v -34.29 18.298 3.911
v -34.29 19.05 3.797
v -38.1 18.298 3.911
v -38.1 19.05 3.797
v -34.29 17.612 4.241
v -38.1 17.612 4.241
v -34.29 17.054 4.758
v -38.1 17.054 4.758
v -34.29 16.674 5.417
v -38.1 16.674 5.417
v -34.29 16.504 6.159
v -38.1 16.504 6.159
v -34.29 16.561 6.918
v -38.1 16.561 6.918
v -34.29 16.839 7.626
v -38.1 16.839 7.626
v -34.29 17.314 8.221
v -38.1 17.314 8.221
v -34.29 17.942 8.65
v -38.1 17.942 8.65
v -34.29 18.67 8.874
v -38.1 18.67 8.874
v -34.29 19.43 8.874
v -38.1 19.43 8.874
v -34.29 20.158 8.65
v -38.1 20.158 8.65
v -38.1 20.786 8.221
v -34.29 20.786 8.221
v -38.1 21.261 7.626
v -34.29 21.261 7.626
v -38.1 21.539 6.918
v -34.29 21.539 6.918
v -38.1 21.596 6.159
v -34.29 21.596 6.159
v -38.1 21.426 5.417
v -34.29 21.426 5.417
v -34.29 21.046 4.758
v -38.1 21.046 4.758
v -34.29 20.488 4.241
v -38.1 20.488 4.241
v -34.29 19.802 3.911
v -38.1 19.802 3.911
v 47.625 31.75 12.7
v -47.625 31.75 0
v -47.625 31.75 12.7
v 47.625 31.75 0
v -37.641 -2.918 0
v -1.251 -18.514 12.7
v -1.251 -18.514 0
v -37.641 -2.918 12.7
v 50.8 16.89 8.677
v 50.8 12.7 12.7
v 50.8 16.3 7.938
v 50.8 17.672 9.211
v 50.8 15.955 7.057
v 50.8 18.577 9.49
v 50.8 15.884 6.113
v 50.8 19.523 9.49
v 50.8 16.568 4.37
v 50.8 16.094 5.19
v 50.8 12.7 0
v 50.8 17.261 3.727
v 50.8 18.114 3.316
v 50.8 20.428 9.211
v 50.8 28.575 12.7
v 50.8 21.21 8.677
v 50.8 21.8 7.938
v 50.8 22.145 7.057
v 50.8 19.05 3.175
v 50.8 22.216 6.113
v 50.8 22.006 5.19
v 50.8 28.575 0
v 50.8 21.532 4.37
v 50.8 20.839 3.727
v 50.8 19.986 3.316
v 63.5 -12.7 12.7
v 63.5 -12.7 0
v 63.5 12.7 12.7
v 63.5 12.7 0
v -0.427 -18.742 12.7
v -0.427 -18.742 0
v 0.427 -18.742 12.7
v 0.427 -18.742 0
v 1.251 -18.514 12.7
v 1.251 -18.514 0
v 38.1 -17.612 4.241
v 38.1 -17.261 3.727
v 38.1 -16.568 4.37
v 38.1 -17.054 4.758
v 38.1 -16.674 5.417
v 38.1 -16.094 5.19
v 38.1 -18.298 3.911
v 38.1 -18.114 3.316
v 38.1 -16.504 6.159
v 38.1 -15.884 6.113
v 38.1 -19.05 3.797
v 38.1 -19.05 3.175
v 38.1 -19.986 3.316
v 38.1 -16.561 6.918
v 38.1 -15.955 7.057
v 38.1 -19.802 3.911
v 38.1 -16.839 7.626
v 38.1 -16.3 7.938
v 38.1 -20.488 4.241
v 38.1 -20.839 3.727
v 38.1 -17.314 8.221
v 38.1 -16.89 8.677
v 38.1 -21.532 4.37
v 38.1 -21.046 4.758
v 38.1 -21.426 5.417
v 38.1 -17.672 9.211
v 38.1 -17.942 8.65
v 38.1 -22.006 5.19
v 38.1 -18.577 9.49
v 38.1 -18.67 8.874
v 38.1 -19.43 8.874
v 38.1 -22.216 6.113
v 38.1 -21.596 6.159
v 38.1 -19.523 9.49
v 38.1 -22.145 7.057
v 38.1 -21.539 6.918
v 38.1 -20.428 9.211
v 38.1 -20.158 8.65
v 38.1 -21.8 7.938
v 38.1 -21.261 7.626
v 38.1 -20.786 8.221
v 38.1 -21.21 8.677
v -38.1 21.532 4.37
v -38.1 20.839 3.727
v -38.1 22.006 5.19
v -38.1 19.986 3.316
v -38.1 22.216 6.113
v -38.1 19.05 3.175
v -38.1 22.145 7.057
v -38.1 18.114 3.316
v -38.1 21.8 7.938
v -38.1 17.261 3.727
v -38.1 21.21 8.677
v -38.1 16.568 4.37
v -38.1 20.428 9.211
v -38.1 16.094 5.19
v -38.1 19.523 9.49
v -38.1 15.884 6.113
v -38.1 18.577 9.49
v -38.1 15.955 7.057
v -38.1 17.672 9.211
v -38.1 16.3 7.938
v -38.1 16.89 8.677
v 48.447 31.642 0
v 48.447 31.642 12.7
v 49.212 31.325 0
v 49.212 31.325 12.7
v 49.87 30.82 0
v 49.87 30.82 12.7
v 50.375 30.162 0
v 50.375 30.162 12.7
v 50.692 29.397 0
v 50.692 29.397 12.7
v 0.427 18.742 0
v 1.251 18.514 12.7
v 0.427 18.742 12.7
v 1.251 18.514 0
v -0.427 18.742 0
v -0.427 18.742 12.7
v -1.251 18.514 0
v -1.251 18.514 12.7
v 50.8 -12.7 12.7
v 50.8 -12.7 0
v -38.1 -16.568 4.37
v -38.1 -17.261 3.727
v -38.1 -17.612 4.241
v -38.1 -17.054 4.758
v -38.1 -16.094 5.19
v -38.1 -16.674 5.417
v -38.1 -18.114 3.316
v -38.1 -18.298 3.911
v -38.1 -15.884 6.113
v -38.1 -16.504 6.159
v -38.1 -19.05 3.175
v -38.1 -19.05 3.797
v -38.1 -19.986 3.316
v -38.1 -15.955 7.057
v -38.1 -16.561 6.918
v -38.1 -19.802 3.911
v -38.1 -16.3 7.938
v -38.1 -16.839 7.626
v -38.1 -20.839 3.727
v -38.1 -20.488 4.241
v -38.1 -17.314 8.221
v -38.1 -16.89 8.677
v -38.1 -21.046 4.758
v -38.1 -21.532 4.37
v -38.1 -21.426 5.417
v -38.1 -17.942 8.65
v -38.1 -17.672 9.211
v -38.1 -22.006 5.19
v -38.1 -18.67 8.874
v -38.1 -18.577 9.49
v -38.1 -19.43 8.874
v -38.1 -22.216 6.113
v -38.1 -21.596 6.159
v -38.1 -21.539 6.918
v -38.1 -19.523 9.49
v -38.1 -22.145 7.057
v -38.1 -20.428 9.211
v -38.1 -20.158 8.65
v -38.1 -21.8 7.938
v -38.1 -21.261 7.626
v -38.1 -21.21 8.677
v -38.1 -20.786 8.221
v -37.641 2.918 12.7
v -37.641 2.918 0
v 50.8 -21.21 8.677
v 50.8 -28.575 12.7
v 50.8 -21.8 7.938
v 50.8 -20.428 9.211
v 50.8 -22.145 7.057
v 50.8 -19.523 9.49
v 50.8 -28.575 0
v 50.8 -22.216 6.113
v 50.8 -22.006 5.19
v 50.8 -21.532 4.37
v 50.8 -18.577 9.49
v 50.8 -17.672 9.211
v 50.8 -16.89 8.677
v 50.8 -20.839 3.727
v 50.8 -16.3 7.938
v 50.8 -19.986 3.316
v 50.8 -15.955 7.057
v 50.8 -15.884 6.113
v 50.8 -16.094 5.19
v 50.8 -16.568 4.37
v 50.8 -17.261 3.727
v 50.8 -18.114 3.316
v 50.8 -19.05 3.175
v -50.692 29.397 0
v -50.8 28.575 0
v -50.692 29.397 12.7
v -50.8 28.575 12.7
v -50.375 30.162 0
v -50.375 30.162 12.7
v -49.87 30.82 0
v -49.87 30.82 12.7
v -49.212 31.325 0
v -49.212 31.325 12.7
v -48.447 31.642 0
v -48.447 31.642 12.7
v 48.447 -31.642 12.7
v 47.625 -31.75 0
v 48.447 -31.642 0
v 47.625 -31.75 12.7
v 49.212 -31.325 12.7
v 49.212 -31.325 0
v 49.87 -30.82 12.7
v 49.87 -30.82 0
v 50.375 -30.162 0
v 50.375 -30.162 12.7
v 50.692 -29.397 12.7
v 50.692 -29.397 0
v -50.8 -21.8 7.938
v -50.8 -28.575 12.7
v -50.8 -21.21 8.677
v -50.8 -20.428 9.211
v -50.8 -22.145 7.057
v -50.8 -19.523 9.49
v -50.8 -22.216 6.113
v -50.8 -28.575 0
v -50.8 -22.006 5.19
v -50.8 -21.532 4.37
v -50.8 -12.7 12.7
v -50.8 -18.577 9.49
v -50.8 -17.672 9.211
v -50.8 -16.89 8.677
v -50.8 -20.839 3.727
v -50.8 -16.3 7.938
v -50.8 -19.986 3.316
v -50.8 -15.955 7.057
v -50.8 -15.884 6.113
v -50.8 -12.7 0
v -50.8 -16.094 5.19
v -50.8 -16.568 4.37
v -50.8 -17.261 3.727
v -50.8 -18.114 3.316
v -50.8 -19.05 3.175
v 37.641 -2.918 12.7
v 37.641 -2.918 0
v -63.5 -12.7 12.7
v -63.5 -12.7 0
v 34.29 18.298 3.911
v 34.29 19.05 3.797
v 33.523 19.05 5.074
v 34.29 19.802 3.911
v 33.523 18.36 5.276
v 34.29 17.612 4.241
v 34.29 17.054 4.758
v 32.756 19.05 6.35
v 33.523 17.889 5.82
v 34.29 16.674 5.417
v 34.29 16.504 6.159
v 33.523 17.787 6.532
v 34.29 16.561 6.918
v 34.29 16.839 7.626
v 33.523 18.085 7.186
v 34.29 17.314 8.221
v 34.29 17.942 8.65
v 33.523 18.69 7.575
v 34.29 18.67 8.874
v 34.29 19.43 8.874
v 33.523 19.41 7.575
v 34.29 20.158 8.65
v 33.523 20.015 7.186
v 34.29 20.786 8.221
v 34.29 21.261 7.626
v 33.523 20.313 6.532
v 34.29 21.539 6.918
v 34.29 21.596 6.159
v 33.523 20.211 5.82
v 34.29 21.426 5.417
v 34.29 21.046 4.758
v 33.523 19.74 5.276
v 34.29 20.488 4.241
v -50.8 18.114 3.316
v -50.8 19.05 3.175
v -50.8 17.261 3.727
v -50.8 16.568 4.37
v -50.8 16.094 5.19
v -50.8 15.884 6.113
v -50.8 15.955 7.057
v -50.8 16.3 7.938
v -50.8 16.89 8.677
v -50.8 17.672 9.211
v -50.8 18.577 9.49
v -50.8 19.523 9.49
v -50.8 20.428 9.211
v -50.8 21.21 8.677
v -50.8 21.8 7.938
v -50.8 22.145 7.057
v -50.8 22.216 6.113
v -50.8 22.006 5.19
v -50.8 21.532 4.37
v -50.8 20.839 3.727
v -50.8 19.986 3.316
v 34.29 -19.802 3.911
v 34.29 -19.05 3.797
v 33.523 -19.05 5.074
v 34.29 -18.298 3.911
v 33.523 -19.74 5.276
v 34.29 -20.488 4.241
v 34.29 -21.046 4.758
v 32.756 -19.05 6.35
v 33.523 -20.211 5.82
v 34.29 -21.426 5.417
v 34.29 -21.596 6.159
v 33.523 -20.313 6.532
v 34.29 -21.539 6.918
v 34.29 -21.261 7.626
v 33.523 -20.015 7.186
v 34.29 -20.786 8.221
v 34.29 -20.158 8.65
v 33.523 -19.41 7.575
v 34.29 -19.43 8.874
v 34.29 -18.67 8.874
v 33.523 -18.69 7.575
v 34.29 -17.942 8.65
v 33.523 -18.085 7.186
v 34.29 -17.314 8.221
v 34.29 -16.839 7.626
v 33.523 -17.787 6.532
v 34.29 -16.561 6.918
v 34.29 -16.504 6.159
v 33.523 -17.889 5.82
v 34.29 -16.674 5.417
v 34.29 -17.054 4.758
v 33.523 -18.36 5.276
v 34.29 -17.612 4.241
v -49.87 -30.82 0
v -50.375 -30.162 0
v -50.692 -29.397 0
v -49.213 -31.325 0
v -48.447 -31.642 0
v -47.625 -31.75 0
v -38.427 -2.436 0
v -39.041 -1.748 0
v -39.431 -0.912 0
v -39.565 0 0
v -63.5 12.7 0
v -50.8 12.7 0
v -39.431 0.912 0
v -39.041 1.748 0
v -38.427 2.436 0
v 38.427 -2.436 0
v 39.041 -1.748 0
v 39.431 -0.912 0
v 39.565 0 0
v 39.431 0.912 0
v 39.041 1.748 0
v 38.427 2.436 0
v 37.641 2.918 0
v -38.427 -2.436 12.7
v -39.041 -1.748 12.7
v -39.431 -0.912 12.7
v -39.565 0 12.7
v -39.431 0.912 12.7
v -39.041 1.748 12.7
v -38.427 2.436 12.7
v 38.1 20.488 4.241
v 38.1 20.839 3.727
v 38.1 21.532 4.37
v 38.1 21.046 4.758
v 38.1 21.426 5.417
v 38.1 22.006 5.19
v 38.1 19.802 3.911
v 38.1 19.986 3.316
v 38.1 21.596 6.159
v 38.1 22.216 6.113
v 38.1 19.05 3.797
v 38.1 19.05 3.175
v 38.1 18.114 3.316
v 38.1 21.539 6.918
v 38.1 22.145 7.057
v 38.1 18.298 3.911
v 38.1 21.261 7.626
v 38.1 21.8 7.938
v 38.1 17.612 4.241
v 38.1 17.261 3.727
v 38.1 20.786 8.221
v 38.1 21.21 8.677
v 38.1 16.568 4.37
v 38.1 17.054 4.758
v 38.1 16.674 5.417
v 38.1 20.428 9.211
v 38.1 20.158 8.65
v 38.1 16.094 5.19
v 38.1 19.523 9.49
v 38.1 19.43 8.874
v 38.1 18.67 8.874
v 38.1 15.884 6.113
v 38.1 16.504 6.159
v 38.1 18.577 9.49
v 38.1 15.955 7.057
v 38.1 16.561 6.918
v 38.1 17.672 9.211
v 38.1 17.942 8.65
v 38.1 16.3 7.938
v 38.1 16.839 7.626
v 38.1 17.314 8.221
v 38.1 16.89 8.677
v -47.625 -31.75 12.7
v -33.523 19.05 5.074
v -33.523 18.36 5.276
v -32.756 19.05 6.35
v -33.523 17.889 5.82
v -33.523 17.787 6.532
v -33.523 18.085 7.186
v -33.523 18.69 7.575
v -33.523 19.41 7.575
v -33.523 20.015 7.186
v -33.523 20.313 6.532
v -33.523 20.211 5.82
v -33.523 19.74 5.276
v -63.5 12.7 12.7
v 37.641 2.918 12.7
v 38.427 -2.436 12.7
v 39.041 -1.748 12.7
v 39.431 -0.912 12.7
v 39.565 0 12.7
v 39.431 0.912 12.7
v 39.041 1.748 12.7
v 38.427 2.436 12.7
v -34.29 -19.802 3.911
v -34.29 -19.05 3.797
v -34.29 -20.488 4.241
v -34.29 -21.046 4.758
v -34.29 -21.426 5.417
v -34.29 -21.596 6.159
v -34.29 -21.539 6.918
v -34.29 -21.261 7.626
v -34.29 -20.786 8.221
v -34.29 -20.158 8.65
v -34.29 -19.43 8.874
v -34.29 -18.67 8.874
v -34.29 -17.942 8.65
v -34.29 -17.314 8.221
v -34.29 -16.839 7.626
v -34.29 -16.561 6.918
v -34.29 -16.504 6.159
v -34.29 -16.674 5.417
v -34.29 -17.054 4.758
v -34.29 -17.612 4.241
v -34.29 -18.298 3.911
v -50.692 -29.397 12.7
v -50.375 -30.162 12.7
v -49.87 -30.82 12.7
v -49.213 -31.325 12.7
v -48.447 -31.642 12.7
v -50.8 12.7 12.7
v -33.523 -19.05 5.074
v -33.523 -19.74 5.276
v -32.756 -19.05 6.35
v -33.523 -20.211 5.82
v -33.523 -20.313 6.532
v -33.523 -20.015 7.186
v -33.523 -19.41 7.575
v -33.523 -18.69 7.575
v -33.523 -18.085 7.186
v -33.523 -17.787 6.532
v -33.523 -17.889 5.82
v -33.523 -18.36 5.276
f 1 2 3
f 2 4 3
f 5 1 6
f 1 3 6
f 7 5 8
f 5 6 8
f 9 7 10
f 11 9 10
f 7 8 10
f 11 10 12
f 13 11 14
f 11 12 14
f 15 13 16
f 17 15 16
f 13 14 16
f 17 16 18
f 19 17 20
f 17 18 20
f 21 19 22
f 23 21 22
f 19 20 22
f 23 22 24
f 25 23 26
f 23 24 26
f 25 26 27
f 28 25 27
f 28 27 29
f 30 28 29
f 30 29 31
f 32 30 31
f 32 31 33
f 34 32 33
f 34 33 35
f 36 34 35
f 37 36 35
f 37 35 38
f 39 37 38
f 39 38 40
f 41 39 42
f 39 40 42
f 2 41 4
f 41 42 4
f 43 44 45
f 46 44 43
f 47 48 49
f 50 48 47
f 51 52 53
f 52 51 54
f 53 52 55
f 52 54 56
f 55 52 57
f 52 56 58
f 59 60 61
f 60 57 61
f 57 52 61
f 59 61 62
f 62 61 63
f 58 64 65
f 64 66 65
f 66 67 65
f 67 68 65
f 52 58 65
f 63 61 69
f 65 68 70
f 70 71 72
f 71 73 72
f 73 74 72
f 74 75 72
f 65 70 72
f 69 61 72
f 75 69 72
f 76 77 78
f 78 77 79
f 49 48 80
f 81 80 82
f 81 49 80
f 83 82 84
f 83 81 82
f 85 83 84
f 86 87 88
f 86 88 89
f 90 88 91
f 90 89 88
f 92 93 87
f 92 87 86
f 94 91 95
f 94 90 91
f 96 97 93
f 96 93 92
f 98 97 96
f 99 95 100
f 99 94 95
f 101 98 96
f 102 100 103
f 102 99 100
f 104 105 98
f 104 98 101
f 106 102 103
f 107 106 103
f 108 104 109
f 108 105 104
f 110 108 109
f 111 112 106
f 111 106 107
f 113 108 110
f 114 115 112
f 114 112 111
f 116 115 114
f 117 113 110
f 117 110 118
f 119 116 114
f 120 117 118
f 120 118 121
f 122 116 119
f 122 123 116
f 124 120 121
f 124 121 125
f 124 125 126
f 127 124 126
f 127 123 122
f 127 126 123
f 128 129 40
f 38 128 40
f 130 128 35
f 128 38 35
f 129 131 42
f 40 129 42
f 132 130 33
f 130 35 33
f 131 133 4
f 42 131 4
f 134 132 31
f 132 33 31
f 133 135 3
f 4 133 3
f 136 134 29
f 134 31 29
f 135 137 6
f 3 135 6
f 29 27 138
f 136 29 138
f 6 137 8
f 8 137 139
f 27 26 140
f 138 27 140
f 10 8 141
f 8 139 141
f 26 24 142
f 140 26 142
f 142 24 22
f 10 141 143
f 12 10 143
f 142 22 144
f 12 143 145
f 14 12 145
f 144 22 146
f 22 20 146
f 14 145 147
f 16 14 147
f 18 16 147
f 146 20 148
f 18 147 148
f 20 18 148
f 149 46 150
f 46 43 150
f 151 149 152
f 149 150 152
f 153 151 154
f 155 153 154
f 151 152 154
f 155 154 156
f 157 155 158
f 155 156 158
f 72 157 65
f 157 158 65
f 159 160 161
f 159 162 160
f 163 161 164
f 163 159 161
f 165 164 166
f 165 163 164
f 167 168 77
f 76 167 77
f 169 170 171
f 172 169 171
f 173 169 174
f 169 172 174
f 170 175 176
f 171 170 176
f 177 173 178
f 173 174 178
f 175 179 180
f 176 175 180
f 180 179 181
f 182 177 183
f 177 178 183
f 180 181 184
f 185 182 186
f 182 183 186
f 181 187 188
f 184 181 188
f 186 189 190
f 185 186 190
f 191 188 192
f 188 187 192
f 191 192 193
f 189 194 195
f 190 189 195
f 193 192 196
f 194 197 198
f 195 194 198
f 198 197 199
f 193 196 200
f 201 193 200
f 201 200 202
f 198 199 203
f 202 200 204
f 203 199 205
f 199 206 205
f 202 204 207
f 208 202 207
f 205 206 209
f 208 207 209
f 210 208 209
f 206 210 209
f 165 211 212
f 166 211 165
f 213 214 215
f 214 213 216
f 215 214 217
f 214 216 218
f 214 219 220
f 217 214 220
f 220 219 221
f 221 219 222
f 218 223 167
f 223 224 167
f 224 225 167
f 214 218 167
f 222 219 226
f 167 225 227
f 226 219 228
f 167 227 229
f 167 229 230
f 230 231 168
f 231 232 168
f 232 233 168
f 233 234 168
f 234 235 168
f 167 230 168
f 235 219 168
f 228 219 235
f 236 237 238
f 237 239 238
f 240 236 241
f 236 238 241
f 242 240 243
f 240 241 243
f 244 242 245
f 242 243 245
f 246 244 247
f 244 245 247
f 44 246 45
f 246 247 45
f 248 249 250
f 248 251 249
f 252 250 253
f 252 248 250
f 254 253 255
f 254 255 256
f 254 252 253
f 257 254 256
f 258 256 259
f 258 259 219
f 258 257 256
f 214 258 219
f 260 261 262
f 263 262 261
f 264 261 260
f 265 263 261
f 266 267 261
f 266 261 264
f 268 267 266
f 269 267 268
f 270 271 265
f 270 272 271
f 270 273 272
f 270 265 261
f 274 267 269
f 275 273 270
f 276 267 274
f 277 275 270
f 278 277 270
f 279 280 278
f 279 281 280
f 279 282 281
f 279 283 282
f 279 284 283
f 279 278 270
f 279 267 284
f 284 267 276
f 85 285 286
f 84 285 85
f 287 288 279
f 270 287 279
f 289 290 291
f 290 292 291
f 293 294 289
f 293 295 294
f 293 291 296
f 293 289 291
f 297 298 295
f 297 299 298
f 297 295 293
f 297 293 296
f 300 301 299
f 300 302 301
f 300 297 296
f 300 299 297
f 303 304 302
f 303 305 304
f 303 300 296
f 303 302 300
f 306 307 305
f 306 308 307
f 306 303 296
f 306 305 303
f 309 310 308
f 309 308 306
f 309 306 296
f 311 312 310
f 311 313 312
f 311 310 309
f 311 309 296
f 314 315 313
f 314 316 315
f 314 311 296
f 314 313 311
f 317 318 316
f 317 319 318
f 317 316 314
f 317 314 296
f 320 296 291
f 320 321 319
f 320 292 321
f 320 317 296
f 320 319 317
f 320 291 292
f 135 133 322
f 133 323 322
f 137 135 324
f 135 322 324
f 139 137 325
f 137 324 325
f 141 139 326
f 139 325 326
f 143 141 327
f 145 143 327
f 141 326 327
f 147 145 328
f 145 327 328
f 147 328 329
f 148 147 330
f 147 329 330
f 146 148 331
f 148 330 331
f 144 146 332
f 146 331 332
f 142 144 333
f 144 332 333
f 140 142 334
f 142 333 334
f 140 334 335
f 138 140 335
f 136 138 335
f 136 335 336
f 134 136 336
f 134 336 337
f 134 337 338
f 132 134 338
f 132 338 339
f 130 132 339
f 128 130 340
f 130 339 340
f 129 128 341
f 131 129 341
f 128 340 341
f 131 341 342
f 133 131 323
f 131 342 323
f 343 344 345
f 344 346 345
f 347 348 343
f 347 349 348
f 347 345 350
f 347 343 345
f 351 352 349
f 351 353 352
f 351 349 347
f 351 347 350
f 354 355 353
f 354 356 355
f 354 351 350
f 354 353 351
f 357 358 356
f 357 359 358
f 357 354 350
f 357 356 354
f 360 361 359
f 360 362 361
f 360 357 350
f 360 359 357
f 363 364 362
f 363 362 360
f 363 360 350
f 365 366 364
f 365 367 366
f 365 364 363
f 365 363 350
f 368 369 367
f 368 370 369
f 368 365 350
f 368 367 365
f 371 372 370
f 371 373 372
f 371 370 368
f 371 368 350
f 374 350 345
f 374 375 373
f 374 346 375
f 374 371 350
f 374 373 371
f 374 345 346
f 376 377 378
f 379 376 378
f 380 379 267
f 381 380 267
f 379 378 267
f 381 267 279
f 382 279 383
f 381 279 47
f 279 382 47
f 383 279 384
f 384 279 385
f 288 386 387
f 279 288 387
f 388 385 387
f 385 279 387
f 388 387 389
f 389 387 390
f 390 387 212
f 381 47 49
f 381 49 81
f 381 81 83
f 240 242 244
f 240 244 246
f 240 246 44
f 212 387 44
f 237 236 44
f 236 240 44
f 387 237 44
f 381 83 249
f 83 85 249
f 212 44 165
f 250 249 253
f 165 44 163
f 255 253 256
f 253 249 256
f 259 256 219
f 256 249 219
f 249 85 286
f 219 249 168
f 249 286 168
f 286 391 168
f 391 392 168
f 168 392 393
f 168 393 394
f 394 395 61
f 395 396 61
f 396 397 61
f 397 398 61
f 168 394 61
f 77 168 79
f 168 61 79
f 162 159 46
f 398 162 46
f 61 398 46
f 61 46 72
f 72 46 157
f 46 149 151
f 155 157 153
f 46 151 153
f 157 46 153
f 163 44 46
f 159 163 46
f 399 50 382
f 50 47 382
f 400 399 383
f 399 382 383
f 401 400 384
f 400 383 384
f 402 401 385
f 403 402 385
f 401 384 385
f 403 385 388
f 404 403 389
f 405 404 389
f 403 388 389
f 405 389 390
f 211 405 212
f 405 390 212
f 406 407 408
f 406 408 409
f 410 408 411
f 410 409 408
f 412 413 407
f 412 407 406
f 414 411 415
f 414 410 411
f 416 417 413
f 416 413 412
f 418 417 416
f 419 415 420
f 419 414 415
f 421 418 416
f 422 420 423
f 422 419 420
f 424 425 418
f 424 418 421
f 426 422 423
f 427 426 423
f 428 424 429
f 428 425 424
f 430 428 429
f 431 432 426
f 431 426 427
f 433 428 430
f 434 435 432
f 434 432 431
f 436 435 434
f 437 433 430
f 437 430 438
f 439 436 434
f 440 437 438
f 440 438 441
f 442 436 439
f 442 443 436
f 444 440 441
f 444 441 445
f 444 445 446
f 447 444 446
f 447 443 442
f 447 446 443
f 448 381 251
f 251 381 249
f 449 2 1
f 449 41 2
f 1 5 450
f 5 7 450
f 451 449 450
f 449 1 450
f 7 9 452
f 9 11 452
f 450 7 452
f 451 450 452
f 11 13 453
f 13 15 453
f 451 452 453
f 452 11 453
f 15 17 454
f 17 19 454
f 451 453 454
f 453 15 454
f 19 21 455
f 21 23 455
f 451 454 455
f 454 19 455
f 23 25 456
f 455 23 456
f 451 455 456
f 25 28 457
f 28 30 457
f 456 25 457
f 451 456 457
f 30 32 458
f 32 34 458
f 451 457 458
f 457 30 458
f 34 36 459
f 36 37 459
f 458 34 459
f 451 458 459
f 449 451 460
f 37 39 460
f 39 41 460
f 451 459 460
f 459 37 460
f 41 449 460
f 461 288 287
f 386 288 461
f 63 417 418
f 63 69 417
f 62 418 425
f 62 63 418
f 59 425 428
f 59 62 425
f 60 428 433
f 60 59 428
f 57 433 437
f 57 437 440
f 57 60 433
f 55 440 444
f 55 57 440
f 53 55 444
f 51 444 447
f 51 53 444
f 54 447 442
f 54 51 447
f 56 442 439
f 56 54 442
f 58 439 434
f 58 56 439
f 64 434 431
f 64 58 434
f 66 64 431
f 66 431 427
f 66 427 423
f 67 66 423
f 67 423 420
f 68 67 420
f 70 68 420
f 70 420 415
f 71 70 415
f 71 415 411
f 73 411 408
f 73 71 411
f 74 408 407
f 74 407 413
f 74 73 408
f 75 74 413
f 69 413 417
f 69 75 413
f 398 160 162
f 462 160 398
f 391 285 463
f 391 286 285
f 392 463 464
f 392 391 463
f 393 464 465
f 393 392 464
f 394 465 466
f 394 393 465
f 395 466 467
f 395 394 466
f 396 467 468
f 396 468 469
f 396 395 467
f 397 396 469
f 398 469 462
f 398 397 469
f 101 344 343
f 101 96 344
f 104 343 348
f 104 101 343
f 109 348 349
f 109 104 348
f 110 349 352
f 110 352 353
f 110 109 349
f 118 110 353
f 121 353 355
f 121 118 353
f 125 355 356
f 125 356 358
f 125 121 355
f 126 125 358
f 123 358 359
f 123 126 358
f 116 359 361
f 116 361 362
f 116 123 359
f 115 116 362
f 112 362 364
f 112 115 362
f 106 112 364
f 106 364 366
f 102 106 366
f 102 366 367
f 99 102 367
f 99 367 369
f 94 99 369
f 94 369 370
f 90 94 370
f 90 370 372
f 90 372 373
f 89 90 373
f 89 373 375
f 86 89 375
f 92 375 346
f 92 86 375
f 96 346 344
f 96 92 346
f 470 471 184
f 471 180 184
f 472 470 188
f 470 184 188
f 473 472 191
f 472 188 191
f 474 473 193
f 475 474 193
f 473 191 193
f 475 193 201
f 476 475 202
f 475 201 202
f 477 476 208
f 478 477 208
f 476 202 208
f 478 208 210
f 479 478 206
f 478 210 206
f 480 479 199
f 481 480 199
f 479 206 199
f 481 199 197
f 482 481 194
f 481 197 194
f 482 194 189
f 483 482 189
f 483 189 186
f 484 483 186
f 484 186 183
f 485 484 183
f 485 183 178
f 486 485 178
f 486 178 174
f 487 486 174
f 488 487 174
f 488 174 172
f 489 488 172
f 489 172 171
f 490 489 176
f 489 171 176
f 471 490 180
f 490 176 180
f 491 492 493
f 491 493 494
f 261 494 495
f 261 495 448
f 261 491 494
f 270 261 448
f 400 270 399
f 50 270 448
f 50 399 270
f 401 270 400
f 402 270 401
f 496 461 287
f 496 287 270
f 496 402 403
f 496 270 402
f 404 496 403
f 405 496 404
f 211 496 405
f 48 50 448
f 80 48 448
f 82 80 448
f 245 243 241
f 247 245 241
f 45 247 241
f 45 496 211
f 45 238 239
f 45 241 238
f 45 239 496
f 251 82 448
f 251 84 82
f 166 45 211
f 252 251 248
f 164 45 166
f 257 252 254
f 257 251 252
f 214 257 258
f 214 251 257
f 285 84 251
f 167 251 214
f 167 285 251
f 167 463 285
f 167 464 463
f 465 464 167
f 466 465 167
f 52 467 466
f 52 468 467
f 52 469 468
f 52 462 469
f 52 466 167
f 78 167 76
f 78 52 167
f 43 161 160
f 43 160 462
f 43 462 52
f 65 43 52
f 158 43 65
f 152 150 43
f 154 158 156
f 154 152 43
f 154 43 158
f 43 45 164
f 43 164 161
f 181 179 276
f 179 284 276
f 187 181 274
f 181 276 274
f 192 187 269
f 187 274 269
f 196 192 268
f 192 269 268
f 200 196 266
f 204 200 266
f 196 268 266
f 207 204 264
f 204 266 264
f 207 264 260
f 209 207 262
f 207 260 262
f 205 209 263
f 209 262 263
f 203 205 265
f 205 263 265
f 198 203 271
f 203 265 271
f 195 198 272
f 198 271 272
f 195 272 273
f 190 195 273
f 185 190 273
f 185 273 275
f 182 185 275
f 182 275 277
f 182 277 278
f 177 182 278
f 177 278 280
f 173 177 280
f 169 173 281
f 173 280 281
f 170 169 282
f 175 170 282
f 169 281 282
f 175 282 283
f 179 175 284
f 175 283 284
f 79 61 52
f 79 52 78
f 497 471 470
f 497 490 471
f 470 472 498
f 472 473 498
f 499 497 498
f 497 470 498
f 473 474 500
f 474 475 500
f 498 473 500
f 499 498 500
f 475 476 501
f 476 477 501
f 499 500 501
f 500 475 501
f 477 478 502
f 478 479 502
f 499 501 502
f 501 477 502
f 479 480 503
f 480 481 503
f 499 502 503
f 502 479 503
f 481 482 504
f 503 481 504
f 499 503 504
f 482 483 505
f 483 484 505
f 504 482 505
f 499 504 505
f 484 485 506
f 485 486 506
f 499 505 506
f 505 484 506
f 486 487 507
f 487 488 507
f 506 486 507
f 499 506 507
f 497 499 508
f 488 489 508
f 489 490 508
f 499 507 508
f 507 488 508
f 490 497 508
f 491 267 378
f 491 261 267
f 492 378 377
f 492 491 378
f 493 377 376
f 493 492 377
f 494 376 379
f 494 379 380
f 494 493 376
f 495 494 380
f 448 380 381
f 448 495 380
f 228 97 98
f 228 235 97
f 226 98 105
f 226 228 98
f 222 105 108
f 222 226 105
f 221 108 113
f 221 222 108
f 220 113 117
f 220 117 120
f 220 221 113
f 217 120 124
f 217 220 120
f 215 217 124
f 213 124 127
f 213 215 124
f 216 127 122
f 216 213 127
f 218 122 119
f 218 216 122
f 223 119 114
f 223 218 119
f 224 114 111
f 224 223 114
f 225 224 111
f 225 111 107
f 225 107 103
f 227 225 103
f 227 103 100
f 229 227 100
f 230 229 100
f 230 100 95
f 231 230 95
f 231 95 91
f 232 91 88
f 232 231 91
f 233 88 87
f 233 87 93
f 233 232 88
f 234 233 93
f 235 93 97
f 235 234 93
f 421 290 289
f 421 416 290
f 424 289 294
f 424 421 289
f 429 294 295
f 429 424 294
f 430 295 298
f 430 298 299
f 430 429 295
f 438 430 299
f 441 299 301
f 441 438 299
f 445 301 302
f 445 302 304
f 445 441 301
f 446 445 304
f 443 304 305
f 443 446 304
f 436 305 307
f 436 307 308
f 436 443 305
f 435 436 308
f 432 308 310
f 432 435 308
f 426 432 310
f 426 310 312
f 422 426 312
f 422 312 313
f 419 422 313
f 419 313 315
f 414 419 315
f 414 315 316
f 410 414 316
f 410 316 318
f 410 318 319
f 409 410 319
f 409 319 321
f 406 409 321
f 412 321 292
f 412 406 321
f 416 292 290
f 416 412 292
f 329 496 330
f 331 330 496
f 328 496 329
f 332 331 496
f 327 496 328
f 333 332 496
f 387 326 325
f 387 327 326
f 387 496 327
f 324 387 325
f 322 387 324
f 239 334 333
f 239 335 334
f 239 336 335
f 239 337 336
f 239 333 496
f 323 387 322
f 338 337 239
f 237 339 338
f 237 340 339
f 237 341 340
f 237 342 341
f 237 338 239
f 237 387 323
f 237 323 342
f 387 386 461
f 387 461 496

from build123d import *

# Parameters (mm, degrees)
SKETCH1_W                        = 12.7
SKETCH1_H                        = 25.4
SKETCH1_W_2                      = 101.6
SKETCH1_H_2                      = 63.5
BOSS_EXTRUDE1_DEPTH              = 12.7
F_1_4_20_TAPPED_HOLE1_AT_2_COUNT = 2
F_1_4_20_TAPPED_HOLE1_AT_2_PITCH = 38.1
CUT_EXTRUDE1_DEPTH               = 13.7
FILLET1_R                        = 3.175
FILLET2_R                        = 3.175


with BuildPart() as part:
    # Sketch1 → Boss-Extrude1 (new body)
    with BuildSketch(Plane.XY):
        with Locations((-57.15, 0)):
            Rectangle(SKETCH1_W, SKETCH1_H)
        Rectangle(SKETCH1_W_2, SKETCH1_H_2)
        with Locations((57.15, 0)):
            Rectangle(SKETCH1_W, SKETCH1_H)
    extrude(amount=BOSS_EXTRUDE1_DEPTH)

    # Sketch2 → 1/4-20 Tapped Hole1 (revolve, cut)
    with BuildSketch(Plane(origin=(50.8, 19.05, 6.35), x_dir=(0, 0, -1), z_dir=(0, 1, 0))):
        Polygon((0, 0), (0, 18.043816902), (2.5527, 16.51), (2.5527, 12.7), (3.175, 12.7), (3.175, 0), align=None)
    f_1_4_20_tapped_hole1 = revolve(axis=Axis((57.15, 19.05, 6.35), (-1, 0, 0)), mode=Mode.SUBTRACT)

    # 1/4-20 Tapped Hole1 at 2: 1/4-20 Tapped Hole1 ×2
    with Locations(*[(0, -i * F_1_4_20_TAPPED_HOLE1_AT_2_PITCH, 0) for i in range(1, F_1_4_20_TAPPED_HOLE1_AT_2_COUNT)]):
        add(f_1_4_20_tapped_hole1, mode=Mode.SUBTRACT)

    # Mirror1: 1/4-20 Tapped Hole1 across plane
    add(f_1_4_20_tapped_hole1.mirror(Plane(origin=(0, 0, 0), x_dir=(0, 0, 1), z_dir=(1, 0, 0))), mode=Mode.SUBTRACT)

    # Mirror1 copy 1 sketch → Mirror1 copy 1 (revolve, cut)
    with BuildSketch(Plane(origin=(-50.8, -19.05, 6.35), x_dir=(0, 0, -1), z_dir=(0, 1, 0))):
        Polygon((0, 0), (0, -18.043816902), (2.5527, -16.51), (2.5527, -12.7), (3.175, -12.7), (3.175, 0), align=None)
    revolve(axis=Axis((-57.15, -19.05, 6.35), (-1, 0, 0)), mode=Mode.SUBTRACT)

    # Sketch4 → Cut-Extrude1 (cut, through all)
    with BuildSketch(Plane.XY.offset(12.7)):
        Polygon((-44.45, 0), (0, 19.05), (44.45, 0), (0, -19.05), align=None)
    extrude(amount=-CUT_EXTRUDE1_DEPTH, mode=Mode.SUBTRACT)

    # Fillet1
    fillet1_edges = [part.edges().sort_by_distance(p)[0] for p in [
        (0, 19.05, 6.35),
        (44.45, 0, 6.35),
        (0, -19.05, 6.35),
        (-44.45, 0, 6.35),
    ]]
    fillet(fillet1_edges, radius=FILLET1_R)

    # Fillet2
    fillet2_edges = [part.edges().sort_by_distance(p)[0] for p in [
        (-50.8, 31.75, 6.35),
        (50.8, 31.75, 6.35),
        (50.8, -31.75, 6.35),
        (-50.8, -31.75, 6.35),
    ]]
    fillet(fillet2_edges, radius=FILLET2_R)


solid = part.part
